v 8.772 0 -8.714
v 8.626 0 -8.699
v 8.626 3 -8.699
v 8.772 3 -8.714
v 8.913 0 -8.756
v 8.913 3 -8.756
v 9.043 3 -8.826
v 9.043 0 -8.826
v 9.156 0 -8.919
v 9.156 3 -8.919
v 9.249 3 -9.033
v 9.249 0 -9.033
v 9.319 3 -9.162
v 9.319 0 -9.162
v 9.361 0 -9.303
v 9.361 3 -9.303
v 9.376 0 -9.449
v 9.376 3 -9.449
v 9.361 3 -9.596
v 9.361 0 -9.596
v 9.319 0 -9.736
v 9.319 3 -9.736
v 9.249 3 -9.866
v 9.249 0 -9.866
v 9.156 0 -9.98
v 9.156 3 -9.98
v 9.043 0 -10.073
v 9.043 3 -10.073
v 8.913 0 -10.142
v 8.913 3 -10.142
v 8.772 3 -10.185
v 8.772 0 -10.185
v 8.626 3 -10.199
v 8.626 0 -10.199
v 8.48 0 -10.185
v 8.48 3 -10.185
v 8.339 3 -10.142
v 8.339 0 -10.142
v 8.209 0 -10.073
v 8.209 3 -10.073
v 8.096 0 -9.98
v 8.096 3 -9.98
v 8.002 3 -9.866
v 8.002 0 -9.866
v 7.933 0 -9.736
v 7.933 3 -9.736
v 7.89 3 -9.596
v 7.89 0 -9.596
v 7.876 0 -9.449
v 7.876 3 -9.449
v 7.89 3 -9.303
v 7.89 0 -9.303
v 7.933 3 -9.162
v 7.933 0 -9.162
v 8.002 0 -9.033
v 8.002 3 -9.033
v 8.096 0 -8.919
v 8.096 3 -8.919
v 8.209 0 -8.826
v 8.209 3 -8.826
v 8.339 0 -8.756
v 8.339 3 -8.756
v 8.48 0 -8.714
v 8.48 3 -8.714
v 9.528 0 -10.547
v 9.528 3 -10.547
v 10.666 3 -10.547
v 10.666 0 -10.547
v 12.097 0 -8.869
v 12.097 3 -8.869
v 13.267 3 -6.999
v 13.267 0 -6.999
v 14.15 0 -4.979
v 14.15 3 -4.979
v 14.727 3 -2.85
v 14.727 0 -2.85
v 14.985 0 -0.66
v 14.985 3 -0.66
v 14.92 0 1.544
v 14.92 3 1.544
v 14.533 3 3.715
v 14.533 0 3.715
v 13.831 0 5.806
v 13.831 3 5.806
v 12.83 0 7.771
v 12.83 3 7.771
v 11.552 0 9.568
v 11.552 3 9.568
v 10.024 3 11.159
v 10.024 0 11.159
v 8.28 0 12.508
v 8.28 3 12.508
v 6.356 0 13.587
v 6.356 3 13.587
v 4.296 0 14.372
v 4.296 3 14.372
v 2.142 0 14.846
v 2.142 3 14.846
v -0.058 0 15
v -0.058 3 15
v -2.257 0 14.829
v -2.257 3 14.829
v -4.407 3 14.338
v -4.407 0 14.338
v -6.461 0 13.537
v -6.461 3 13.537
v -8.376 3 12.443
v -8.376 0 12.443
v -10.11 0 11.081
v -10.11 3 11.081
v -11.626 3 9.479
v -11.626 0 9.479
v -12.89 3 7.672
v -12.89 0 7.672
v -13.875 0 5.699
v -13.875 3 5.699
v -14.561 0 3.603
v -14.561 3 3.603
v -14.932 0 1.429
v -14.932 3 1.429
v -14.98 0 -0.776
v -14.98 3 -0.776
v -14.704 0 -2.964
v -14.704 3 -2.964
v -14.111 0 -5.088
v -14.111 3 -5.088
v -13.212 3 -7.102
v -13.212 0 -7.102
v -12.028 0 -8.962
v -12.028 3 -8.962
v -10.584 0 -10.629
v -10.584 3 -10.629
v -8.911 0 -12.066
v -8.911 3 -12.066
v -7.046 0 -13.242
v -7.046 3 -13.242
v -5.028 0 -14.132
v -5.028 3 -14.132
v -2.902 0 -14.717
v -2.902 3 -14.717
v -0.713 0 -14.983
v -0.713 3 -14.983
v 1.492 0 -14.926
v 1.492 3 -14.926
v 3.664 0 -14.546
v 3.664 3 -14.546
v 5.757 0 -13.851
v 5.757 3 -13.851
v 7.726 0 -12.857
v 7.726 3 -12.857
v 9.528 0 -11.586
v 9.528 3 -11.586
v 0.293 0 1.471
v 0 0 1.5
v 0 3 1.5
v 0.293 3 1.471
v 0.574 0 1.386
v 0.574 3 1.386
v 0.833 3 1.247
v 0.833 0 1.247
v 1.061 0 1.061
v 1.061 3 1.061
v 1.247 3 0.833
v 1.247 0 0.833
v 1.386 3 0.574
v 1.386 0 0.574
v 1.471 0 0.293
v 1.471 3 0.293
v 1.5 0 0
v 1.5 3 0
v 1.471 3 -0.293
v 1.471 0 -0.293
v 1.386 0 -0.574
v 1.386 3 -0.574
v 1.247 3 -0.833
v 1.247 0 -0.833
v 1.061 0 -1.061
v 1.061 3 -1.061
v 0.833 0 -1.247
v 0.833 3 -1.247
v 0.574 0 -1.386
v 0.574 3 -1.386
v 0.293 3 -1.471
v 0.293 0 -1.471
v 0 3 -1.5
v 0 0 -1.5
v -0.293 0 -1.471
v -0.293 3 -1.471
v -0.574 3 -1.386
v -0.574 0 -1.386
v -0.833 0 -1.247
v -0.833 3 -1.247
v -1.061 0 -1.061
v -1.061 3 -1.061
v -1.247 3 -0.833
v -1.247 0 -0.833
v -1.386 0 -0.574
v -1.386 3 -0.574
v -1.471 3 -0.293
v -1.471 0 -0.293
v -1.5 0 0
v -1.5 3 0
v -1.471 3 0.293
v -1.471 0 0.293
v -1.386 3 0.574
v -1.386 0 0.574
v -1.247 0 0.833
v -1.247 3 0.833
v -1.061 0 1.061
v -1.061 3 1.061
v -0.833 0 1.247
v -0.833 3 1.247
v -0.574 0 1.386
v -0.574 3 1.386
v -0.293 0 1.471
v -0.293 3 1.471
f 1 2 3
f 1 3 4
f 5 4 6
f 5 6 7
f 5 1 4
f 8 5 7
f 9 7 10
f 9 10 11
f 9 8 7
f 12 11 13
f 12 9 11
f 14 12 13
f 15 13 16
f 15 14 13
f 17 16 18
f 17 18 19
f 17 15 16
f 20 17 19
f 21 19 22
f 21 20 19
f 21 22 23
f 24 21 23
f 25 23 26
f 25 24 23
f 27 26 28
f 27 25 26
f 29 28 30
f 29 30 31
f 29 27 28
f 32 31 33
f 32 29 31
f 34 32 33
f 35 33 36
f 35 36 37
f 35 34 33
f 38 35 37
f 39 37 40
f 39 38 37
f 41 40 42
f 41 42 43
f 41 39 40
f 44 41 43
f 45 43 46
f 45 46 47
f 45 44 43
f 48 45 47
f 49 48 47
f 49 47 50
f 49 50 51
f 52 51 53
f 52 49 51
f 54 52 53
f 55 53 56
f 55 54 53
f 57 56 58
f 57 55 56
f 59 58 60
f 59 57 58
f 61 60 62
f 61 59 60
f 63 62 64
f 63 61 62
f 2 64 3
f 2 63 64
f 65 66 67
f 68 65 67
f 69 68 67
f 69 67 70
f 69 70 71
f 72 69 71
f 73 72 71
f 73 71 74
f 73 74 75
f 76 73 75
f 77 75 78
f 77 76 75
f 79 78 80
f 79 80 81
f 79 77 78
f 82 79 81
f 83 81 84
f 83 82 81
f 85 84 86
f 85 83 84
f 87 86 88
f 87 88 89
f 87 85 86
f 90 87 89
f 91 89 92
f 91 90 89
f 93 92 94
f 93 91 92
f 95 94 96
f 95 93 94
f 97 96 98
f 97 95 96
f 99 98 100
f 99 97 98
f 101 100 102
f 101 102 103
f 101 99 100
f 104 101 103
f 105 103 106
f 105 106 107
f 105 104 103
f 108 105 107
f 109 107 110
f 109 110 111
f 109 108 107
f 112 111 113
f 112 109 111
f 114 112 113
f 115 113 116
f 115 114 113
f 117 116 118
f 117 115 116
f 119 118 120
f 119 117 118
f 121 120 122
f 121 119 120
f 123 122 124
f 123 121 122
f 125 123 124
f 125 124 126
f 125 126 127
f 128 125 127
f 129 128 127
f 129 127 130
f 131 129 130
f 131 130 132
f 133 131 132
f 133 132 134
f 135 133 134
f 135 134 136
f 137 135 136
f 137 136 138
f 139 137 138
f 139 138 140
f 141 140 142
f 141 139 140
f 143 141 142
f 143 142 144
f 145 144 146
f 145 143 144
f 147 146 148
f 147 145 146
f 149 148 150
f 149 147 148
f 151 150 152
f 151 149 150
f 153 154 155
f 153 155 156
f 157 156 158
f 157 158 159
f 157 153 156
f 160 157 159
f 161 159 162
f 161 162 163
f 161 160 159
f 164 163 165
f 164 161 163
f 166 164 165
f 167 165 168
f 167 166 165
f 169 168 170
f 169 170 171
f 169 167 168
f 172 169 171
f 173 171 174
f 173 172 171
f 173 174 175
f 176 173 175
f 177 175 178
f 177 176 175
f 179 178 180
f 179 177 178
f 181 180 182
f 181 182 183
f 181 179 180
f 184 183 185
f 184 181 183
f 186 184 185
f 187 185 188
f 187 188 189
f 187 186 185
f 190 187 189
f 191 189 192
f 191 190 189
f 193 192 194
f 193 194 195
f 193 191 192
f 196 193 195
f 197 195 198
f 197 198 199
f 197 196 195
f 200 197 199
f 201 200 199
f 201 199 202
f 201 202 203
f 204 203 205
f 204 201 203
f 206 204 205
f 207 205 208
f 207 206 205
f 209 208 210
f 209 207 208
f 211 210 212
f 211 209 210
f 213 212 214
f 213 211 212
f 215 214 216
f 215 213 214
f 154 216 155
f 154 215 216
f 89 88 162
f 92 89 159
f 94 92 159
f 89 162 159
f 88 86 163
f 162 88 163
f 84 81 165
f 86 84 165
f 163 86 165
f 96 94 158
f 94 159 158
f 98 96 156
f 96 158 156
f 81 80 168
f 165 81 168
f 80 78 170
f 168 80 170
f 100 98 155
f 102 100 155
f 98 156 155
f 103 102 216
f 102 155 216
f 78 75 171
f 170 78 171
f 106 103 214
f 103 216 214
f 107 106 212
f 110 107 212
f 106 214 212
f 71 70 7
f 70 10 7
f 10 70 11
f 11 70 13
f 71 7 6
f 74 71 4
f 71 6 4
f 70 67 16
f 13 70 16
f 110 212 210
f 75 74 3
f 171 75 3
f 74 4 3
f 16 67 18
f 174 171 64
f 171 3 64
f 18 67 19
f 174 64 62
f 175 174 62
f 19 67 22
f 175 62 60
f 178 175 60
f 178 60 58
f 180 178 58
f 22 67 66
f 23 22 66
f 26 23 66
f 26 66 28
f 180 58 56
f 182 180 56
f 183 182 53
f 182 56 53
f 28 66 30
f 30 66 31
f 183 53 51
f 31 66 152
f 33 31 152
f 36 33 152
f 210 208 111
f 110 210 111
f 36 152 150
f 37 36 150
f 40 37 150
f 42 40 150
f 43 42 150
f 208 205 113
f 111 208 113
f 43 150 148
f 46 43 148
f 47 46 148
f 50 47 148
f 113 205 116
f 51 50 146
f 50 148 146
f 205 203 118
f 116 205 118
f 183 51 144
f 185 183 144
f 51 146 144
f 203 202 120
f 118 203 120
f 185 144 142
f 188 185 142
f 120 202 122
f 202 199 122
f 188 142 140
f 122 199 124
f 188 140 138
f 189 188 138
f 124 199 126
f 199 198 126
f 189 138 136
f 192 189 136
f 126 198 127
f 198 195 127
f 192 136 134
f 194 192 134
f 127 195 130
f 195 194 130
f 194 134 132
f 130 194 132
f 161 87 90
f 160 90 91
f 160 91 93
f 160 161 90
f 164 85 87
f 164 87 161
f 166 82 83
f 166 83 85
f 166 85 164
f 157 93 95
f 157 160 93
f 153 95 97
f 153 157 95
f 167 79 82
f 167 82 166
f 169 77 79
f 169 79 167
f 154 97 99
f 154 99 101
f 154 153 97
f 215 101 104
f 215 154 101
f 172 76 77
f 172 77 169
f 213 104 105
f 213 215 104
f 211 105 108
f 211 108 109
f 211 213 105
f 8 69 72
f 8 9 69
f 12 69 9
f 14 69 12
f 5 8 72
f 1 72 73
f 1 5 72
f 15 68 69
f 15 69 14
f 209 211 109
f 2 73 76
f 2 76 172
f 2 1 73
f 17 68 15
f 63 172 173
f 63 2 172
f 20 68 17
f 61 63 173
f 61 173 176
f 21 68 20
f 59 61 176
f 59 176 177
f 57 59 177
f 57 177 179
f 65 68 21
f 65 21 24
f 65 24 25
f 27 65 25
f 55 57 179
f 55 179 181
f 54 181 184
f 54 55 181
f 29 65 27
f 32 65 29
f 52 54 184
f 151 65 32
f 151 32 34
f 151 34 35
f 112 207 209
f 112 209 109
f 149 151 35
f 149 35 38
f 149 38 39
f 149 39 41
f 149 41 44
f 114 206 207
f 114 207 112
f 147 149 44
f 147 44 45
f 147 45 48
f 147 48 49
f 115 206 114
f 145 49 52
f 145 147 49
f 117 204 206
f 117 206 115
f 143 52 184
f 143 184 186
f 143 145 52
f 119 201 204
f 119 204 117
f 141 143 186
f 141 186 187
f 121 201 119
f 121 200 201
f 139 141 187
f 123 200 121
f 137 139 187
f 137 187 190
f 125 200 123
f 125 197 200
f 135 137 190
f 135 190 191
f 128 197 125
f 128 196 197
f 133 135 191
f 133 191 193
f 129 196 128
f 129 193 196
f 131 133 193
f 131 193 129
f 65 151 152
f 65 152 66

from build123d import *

# Parameters (mm, degrees)
ESBO_O1_R                = 1.5
ESBO_O1_R_2              = 0.75
RESSALTO_EXTRUS_O1_DEPTH = 3


with BuildPart() as part:
    # Esboço1 → Ressalto-extrusão1 (new body)
    with BuildSketch(Plane(origin=(0, 0, 0), x_dir=(1, 0, 0), z_dir=(0, 1, 0))):
        with BuildLine():
            Line((9.52753895, 11.585594571), (9.52753895, 10.546827297))
            Line((9.52753895, 10.546827297), (10.666041157, 10.546827297))
            ThreePointArc((10.666041157, 10.546827297), (-10.110139897, -11.080842534), (9.52753895, 11.585594571))
        make_face()
        with Locations(Location((0, 0, 0), (0, 0, 270))):
            Circle(ESBO_O1_R, mode=Mode.SUBTRACT)
        with Locations(Location((8.625869215, 9.449196698, 0), (0, 0, 270))):
            Circle(ESBO_O1_R_2, mode=Mode.SUBTRACT)
    extrude(amount=RESSALTO_EXTRUS_O1_DEPTH)


solid = part.part
